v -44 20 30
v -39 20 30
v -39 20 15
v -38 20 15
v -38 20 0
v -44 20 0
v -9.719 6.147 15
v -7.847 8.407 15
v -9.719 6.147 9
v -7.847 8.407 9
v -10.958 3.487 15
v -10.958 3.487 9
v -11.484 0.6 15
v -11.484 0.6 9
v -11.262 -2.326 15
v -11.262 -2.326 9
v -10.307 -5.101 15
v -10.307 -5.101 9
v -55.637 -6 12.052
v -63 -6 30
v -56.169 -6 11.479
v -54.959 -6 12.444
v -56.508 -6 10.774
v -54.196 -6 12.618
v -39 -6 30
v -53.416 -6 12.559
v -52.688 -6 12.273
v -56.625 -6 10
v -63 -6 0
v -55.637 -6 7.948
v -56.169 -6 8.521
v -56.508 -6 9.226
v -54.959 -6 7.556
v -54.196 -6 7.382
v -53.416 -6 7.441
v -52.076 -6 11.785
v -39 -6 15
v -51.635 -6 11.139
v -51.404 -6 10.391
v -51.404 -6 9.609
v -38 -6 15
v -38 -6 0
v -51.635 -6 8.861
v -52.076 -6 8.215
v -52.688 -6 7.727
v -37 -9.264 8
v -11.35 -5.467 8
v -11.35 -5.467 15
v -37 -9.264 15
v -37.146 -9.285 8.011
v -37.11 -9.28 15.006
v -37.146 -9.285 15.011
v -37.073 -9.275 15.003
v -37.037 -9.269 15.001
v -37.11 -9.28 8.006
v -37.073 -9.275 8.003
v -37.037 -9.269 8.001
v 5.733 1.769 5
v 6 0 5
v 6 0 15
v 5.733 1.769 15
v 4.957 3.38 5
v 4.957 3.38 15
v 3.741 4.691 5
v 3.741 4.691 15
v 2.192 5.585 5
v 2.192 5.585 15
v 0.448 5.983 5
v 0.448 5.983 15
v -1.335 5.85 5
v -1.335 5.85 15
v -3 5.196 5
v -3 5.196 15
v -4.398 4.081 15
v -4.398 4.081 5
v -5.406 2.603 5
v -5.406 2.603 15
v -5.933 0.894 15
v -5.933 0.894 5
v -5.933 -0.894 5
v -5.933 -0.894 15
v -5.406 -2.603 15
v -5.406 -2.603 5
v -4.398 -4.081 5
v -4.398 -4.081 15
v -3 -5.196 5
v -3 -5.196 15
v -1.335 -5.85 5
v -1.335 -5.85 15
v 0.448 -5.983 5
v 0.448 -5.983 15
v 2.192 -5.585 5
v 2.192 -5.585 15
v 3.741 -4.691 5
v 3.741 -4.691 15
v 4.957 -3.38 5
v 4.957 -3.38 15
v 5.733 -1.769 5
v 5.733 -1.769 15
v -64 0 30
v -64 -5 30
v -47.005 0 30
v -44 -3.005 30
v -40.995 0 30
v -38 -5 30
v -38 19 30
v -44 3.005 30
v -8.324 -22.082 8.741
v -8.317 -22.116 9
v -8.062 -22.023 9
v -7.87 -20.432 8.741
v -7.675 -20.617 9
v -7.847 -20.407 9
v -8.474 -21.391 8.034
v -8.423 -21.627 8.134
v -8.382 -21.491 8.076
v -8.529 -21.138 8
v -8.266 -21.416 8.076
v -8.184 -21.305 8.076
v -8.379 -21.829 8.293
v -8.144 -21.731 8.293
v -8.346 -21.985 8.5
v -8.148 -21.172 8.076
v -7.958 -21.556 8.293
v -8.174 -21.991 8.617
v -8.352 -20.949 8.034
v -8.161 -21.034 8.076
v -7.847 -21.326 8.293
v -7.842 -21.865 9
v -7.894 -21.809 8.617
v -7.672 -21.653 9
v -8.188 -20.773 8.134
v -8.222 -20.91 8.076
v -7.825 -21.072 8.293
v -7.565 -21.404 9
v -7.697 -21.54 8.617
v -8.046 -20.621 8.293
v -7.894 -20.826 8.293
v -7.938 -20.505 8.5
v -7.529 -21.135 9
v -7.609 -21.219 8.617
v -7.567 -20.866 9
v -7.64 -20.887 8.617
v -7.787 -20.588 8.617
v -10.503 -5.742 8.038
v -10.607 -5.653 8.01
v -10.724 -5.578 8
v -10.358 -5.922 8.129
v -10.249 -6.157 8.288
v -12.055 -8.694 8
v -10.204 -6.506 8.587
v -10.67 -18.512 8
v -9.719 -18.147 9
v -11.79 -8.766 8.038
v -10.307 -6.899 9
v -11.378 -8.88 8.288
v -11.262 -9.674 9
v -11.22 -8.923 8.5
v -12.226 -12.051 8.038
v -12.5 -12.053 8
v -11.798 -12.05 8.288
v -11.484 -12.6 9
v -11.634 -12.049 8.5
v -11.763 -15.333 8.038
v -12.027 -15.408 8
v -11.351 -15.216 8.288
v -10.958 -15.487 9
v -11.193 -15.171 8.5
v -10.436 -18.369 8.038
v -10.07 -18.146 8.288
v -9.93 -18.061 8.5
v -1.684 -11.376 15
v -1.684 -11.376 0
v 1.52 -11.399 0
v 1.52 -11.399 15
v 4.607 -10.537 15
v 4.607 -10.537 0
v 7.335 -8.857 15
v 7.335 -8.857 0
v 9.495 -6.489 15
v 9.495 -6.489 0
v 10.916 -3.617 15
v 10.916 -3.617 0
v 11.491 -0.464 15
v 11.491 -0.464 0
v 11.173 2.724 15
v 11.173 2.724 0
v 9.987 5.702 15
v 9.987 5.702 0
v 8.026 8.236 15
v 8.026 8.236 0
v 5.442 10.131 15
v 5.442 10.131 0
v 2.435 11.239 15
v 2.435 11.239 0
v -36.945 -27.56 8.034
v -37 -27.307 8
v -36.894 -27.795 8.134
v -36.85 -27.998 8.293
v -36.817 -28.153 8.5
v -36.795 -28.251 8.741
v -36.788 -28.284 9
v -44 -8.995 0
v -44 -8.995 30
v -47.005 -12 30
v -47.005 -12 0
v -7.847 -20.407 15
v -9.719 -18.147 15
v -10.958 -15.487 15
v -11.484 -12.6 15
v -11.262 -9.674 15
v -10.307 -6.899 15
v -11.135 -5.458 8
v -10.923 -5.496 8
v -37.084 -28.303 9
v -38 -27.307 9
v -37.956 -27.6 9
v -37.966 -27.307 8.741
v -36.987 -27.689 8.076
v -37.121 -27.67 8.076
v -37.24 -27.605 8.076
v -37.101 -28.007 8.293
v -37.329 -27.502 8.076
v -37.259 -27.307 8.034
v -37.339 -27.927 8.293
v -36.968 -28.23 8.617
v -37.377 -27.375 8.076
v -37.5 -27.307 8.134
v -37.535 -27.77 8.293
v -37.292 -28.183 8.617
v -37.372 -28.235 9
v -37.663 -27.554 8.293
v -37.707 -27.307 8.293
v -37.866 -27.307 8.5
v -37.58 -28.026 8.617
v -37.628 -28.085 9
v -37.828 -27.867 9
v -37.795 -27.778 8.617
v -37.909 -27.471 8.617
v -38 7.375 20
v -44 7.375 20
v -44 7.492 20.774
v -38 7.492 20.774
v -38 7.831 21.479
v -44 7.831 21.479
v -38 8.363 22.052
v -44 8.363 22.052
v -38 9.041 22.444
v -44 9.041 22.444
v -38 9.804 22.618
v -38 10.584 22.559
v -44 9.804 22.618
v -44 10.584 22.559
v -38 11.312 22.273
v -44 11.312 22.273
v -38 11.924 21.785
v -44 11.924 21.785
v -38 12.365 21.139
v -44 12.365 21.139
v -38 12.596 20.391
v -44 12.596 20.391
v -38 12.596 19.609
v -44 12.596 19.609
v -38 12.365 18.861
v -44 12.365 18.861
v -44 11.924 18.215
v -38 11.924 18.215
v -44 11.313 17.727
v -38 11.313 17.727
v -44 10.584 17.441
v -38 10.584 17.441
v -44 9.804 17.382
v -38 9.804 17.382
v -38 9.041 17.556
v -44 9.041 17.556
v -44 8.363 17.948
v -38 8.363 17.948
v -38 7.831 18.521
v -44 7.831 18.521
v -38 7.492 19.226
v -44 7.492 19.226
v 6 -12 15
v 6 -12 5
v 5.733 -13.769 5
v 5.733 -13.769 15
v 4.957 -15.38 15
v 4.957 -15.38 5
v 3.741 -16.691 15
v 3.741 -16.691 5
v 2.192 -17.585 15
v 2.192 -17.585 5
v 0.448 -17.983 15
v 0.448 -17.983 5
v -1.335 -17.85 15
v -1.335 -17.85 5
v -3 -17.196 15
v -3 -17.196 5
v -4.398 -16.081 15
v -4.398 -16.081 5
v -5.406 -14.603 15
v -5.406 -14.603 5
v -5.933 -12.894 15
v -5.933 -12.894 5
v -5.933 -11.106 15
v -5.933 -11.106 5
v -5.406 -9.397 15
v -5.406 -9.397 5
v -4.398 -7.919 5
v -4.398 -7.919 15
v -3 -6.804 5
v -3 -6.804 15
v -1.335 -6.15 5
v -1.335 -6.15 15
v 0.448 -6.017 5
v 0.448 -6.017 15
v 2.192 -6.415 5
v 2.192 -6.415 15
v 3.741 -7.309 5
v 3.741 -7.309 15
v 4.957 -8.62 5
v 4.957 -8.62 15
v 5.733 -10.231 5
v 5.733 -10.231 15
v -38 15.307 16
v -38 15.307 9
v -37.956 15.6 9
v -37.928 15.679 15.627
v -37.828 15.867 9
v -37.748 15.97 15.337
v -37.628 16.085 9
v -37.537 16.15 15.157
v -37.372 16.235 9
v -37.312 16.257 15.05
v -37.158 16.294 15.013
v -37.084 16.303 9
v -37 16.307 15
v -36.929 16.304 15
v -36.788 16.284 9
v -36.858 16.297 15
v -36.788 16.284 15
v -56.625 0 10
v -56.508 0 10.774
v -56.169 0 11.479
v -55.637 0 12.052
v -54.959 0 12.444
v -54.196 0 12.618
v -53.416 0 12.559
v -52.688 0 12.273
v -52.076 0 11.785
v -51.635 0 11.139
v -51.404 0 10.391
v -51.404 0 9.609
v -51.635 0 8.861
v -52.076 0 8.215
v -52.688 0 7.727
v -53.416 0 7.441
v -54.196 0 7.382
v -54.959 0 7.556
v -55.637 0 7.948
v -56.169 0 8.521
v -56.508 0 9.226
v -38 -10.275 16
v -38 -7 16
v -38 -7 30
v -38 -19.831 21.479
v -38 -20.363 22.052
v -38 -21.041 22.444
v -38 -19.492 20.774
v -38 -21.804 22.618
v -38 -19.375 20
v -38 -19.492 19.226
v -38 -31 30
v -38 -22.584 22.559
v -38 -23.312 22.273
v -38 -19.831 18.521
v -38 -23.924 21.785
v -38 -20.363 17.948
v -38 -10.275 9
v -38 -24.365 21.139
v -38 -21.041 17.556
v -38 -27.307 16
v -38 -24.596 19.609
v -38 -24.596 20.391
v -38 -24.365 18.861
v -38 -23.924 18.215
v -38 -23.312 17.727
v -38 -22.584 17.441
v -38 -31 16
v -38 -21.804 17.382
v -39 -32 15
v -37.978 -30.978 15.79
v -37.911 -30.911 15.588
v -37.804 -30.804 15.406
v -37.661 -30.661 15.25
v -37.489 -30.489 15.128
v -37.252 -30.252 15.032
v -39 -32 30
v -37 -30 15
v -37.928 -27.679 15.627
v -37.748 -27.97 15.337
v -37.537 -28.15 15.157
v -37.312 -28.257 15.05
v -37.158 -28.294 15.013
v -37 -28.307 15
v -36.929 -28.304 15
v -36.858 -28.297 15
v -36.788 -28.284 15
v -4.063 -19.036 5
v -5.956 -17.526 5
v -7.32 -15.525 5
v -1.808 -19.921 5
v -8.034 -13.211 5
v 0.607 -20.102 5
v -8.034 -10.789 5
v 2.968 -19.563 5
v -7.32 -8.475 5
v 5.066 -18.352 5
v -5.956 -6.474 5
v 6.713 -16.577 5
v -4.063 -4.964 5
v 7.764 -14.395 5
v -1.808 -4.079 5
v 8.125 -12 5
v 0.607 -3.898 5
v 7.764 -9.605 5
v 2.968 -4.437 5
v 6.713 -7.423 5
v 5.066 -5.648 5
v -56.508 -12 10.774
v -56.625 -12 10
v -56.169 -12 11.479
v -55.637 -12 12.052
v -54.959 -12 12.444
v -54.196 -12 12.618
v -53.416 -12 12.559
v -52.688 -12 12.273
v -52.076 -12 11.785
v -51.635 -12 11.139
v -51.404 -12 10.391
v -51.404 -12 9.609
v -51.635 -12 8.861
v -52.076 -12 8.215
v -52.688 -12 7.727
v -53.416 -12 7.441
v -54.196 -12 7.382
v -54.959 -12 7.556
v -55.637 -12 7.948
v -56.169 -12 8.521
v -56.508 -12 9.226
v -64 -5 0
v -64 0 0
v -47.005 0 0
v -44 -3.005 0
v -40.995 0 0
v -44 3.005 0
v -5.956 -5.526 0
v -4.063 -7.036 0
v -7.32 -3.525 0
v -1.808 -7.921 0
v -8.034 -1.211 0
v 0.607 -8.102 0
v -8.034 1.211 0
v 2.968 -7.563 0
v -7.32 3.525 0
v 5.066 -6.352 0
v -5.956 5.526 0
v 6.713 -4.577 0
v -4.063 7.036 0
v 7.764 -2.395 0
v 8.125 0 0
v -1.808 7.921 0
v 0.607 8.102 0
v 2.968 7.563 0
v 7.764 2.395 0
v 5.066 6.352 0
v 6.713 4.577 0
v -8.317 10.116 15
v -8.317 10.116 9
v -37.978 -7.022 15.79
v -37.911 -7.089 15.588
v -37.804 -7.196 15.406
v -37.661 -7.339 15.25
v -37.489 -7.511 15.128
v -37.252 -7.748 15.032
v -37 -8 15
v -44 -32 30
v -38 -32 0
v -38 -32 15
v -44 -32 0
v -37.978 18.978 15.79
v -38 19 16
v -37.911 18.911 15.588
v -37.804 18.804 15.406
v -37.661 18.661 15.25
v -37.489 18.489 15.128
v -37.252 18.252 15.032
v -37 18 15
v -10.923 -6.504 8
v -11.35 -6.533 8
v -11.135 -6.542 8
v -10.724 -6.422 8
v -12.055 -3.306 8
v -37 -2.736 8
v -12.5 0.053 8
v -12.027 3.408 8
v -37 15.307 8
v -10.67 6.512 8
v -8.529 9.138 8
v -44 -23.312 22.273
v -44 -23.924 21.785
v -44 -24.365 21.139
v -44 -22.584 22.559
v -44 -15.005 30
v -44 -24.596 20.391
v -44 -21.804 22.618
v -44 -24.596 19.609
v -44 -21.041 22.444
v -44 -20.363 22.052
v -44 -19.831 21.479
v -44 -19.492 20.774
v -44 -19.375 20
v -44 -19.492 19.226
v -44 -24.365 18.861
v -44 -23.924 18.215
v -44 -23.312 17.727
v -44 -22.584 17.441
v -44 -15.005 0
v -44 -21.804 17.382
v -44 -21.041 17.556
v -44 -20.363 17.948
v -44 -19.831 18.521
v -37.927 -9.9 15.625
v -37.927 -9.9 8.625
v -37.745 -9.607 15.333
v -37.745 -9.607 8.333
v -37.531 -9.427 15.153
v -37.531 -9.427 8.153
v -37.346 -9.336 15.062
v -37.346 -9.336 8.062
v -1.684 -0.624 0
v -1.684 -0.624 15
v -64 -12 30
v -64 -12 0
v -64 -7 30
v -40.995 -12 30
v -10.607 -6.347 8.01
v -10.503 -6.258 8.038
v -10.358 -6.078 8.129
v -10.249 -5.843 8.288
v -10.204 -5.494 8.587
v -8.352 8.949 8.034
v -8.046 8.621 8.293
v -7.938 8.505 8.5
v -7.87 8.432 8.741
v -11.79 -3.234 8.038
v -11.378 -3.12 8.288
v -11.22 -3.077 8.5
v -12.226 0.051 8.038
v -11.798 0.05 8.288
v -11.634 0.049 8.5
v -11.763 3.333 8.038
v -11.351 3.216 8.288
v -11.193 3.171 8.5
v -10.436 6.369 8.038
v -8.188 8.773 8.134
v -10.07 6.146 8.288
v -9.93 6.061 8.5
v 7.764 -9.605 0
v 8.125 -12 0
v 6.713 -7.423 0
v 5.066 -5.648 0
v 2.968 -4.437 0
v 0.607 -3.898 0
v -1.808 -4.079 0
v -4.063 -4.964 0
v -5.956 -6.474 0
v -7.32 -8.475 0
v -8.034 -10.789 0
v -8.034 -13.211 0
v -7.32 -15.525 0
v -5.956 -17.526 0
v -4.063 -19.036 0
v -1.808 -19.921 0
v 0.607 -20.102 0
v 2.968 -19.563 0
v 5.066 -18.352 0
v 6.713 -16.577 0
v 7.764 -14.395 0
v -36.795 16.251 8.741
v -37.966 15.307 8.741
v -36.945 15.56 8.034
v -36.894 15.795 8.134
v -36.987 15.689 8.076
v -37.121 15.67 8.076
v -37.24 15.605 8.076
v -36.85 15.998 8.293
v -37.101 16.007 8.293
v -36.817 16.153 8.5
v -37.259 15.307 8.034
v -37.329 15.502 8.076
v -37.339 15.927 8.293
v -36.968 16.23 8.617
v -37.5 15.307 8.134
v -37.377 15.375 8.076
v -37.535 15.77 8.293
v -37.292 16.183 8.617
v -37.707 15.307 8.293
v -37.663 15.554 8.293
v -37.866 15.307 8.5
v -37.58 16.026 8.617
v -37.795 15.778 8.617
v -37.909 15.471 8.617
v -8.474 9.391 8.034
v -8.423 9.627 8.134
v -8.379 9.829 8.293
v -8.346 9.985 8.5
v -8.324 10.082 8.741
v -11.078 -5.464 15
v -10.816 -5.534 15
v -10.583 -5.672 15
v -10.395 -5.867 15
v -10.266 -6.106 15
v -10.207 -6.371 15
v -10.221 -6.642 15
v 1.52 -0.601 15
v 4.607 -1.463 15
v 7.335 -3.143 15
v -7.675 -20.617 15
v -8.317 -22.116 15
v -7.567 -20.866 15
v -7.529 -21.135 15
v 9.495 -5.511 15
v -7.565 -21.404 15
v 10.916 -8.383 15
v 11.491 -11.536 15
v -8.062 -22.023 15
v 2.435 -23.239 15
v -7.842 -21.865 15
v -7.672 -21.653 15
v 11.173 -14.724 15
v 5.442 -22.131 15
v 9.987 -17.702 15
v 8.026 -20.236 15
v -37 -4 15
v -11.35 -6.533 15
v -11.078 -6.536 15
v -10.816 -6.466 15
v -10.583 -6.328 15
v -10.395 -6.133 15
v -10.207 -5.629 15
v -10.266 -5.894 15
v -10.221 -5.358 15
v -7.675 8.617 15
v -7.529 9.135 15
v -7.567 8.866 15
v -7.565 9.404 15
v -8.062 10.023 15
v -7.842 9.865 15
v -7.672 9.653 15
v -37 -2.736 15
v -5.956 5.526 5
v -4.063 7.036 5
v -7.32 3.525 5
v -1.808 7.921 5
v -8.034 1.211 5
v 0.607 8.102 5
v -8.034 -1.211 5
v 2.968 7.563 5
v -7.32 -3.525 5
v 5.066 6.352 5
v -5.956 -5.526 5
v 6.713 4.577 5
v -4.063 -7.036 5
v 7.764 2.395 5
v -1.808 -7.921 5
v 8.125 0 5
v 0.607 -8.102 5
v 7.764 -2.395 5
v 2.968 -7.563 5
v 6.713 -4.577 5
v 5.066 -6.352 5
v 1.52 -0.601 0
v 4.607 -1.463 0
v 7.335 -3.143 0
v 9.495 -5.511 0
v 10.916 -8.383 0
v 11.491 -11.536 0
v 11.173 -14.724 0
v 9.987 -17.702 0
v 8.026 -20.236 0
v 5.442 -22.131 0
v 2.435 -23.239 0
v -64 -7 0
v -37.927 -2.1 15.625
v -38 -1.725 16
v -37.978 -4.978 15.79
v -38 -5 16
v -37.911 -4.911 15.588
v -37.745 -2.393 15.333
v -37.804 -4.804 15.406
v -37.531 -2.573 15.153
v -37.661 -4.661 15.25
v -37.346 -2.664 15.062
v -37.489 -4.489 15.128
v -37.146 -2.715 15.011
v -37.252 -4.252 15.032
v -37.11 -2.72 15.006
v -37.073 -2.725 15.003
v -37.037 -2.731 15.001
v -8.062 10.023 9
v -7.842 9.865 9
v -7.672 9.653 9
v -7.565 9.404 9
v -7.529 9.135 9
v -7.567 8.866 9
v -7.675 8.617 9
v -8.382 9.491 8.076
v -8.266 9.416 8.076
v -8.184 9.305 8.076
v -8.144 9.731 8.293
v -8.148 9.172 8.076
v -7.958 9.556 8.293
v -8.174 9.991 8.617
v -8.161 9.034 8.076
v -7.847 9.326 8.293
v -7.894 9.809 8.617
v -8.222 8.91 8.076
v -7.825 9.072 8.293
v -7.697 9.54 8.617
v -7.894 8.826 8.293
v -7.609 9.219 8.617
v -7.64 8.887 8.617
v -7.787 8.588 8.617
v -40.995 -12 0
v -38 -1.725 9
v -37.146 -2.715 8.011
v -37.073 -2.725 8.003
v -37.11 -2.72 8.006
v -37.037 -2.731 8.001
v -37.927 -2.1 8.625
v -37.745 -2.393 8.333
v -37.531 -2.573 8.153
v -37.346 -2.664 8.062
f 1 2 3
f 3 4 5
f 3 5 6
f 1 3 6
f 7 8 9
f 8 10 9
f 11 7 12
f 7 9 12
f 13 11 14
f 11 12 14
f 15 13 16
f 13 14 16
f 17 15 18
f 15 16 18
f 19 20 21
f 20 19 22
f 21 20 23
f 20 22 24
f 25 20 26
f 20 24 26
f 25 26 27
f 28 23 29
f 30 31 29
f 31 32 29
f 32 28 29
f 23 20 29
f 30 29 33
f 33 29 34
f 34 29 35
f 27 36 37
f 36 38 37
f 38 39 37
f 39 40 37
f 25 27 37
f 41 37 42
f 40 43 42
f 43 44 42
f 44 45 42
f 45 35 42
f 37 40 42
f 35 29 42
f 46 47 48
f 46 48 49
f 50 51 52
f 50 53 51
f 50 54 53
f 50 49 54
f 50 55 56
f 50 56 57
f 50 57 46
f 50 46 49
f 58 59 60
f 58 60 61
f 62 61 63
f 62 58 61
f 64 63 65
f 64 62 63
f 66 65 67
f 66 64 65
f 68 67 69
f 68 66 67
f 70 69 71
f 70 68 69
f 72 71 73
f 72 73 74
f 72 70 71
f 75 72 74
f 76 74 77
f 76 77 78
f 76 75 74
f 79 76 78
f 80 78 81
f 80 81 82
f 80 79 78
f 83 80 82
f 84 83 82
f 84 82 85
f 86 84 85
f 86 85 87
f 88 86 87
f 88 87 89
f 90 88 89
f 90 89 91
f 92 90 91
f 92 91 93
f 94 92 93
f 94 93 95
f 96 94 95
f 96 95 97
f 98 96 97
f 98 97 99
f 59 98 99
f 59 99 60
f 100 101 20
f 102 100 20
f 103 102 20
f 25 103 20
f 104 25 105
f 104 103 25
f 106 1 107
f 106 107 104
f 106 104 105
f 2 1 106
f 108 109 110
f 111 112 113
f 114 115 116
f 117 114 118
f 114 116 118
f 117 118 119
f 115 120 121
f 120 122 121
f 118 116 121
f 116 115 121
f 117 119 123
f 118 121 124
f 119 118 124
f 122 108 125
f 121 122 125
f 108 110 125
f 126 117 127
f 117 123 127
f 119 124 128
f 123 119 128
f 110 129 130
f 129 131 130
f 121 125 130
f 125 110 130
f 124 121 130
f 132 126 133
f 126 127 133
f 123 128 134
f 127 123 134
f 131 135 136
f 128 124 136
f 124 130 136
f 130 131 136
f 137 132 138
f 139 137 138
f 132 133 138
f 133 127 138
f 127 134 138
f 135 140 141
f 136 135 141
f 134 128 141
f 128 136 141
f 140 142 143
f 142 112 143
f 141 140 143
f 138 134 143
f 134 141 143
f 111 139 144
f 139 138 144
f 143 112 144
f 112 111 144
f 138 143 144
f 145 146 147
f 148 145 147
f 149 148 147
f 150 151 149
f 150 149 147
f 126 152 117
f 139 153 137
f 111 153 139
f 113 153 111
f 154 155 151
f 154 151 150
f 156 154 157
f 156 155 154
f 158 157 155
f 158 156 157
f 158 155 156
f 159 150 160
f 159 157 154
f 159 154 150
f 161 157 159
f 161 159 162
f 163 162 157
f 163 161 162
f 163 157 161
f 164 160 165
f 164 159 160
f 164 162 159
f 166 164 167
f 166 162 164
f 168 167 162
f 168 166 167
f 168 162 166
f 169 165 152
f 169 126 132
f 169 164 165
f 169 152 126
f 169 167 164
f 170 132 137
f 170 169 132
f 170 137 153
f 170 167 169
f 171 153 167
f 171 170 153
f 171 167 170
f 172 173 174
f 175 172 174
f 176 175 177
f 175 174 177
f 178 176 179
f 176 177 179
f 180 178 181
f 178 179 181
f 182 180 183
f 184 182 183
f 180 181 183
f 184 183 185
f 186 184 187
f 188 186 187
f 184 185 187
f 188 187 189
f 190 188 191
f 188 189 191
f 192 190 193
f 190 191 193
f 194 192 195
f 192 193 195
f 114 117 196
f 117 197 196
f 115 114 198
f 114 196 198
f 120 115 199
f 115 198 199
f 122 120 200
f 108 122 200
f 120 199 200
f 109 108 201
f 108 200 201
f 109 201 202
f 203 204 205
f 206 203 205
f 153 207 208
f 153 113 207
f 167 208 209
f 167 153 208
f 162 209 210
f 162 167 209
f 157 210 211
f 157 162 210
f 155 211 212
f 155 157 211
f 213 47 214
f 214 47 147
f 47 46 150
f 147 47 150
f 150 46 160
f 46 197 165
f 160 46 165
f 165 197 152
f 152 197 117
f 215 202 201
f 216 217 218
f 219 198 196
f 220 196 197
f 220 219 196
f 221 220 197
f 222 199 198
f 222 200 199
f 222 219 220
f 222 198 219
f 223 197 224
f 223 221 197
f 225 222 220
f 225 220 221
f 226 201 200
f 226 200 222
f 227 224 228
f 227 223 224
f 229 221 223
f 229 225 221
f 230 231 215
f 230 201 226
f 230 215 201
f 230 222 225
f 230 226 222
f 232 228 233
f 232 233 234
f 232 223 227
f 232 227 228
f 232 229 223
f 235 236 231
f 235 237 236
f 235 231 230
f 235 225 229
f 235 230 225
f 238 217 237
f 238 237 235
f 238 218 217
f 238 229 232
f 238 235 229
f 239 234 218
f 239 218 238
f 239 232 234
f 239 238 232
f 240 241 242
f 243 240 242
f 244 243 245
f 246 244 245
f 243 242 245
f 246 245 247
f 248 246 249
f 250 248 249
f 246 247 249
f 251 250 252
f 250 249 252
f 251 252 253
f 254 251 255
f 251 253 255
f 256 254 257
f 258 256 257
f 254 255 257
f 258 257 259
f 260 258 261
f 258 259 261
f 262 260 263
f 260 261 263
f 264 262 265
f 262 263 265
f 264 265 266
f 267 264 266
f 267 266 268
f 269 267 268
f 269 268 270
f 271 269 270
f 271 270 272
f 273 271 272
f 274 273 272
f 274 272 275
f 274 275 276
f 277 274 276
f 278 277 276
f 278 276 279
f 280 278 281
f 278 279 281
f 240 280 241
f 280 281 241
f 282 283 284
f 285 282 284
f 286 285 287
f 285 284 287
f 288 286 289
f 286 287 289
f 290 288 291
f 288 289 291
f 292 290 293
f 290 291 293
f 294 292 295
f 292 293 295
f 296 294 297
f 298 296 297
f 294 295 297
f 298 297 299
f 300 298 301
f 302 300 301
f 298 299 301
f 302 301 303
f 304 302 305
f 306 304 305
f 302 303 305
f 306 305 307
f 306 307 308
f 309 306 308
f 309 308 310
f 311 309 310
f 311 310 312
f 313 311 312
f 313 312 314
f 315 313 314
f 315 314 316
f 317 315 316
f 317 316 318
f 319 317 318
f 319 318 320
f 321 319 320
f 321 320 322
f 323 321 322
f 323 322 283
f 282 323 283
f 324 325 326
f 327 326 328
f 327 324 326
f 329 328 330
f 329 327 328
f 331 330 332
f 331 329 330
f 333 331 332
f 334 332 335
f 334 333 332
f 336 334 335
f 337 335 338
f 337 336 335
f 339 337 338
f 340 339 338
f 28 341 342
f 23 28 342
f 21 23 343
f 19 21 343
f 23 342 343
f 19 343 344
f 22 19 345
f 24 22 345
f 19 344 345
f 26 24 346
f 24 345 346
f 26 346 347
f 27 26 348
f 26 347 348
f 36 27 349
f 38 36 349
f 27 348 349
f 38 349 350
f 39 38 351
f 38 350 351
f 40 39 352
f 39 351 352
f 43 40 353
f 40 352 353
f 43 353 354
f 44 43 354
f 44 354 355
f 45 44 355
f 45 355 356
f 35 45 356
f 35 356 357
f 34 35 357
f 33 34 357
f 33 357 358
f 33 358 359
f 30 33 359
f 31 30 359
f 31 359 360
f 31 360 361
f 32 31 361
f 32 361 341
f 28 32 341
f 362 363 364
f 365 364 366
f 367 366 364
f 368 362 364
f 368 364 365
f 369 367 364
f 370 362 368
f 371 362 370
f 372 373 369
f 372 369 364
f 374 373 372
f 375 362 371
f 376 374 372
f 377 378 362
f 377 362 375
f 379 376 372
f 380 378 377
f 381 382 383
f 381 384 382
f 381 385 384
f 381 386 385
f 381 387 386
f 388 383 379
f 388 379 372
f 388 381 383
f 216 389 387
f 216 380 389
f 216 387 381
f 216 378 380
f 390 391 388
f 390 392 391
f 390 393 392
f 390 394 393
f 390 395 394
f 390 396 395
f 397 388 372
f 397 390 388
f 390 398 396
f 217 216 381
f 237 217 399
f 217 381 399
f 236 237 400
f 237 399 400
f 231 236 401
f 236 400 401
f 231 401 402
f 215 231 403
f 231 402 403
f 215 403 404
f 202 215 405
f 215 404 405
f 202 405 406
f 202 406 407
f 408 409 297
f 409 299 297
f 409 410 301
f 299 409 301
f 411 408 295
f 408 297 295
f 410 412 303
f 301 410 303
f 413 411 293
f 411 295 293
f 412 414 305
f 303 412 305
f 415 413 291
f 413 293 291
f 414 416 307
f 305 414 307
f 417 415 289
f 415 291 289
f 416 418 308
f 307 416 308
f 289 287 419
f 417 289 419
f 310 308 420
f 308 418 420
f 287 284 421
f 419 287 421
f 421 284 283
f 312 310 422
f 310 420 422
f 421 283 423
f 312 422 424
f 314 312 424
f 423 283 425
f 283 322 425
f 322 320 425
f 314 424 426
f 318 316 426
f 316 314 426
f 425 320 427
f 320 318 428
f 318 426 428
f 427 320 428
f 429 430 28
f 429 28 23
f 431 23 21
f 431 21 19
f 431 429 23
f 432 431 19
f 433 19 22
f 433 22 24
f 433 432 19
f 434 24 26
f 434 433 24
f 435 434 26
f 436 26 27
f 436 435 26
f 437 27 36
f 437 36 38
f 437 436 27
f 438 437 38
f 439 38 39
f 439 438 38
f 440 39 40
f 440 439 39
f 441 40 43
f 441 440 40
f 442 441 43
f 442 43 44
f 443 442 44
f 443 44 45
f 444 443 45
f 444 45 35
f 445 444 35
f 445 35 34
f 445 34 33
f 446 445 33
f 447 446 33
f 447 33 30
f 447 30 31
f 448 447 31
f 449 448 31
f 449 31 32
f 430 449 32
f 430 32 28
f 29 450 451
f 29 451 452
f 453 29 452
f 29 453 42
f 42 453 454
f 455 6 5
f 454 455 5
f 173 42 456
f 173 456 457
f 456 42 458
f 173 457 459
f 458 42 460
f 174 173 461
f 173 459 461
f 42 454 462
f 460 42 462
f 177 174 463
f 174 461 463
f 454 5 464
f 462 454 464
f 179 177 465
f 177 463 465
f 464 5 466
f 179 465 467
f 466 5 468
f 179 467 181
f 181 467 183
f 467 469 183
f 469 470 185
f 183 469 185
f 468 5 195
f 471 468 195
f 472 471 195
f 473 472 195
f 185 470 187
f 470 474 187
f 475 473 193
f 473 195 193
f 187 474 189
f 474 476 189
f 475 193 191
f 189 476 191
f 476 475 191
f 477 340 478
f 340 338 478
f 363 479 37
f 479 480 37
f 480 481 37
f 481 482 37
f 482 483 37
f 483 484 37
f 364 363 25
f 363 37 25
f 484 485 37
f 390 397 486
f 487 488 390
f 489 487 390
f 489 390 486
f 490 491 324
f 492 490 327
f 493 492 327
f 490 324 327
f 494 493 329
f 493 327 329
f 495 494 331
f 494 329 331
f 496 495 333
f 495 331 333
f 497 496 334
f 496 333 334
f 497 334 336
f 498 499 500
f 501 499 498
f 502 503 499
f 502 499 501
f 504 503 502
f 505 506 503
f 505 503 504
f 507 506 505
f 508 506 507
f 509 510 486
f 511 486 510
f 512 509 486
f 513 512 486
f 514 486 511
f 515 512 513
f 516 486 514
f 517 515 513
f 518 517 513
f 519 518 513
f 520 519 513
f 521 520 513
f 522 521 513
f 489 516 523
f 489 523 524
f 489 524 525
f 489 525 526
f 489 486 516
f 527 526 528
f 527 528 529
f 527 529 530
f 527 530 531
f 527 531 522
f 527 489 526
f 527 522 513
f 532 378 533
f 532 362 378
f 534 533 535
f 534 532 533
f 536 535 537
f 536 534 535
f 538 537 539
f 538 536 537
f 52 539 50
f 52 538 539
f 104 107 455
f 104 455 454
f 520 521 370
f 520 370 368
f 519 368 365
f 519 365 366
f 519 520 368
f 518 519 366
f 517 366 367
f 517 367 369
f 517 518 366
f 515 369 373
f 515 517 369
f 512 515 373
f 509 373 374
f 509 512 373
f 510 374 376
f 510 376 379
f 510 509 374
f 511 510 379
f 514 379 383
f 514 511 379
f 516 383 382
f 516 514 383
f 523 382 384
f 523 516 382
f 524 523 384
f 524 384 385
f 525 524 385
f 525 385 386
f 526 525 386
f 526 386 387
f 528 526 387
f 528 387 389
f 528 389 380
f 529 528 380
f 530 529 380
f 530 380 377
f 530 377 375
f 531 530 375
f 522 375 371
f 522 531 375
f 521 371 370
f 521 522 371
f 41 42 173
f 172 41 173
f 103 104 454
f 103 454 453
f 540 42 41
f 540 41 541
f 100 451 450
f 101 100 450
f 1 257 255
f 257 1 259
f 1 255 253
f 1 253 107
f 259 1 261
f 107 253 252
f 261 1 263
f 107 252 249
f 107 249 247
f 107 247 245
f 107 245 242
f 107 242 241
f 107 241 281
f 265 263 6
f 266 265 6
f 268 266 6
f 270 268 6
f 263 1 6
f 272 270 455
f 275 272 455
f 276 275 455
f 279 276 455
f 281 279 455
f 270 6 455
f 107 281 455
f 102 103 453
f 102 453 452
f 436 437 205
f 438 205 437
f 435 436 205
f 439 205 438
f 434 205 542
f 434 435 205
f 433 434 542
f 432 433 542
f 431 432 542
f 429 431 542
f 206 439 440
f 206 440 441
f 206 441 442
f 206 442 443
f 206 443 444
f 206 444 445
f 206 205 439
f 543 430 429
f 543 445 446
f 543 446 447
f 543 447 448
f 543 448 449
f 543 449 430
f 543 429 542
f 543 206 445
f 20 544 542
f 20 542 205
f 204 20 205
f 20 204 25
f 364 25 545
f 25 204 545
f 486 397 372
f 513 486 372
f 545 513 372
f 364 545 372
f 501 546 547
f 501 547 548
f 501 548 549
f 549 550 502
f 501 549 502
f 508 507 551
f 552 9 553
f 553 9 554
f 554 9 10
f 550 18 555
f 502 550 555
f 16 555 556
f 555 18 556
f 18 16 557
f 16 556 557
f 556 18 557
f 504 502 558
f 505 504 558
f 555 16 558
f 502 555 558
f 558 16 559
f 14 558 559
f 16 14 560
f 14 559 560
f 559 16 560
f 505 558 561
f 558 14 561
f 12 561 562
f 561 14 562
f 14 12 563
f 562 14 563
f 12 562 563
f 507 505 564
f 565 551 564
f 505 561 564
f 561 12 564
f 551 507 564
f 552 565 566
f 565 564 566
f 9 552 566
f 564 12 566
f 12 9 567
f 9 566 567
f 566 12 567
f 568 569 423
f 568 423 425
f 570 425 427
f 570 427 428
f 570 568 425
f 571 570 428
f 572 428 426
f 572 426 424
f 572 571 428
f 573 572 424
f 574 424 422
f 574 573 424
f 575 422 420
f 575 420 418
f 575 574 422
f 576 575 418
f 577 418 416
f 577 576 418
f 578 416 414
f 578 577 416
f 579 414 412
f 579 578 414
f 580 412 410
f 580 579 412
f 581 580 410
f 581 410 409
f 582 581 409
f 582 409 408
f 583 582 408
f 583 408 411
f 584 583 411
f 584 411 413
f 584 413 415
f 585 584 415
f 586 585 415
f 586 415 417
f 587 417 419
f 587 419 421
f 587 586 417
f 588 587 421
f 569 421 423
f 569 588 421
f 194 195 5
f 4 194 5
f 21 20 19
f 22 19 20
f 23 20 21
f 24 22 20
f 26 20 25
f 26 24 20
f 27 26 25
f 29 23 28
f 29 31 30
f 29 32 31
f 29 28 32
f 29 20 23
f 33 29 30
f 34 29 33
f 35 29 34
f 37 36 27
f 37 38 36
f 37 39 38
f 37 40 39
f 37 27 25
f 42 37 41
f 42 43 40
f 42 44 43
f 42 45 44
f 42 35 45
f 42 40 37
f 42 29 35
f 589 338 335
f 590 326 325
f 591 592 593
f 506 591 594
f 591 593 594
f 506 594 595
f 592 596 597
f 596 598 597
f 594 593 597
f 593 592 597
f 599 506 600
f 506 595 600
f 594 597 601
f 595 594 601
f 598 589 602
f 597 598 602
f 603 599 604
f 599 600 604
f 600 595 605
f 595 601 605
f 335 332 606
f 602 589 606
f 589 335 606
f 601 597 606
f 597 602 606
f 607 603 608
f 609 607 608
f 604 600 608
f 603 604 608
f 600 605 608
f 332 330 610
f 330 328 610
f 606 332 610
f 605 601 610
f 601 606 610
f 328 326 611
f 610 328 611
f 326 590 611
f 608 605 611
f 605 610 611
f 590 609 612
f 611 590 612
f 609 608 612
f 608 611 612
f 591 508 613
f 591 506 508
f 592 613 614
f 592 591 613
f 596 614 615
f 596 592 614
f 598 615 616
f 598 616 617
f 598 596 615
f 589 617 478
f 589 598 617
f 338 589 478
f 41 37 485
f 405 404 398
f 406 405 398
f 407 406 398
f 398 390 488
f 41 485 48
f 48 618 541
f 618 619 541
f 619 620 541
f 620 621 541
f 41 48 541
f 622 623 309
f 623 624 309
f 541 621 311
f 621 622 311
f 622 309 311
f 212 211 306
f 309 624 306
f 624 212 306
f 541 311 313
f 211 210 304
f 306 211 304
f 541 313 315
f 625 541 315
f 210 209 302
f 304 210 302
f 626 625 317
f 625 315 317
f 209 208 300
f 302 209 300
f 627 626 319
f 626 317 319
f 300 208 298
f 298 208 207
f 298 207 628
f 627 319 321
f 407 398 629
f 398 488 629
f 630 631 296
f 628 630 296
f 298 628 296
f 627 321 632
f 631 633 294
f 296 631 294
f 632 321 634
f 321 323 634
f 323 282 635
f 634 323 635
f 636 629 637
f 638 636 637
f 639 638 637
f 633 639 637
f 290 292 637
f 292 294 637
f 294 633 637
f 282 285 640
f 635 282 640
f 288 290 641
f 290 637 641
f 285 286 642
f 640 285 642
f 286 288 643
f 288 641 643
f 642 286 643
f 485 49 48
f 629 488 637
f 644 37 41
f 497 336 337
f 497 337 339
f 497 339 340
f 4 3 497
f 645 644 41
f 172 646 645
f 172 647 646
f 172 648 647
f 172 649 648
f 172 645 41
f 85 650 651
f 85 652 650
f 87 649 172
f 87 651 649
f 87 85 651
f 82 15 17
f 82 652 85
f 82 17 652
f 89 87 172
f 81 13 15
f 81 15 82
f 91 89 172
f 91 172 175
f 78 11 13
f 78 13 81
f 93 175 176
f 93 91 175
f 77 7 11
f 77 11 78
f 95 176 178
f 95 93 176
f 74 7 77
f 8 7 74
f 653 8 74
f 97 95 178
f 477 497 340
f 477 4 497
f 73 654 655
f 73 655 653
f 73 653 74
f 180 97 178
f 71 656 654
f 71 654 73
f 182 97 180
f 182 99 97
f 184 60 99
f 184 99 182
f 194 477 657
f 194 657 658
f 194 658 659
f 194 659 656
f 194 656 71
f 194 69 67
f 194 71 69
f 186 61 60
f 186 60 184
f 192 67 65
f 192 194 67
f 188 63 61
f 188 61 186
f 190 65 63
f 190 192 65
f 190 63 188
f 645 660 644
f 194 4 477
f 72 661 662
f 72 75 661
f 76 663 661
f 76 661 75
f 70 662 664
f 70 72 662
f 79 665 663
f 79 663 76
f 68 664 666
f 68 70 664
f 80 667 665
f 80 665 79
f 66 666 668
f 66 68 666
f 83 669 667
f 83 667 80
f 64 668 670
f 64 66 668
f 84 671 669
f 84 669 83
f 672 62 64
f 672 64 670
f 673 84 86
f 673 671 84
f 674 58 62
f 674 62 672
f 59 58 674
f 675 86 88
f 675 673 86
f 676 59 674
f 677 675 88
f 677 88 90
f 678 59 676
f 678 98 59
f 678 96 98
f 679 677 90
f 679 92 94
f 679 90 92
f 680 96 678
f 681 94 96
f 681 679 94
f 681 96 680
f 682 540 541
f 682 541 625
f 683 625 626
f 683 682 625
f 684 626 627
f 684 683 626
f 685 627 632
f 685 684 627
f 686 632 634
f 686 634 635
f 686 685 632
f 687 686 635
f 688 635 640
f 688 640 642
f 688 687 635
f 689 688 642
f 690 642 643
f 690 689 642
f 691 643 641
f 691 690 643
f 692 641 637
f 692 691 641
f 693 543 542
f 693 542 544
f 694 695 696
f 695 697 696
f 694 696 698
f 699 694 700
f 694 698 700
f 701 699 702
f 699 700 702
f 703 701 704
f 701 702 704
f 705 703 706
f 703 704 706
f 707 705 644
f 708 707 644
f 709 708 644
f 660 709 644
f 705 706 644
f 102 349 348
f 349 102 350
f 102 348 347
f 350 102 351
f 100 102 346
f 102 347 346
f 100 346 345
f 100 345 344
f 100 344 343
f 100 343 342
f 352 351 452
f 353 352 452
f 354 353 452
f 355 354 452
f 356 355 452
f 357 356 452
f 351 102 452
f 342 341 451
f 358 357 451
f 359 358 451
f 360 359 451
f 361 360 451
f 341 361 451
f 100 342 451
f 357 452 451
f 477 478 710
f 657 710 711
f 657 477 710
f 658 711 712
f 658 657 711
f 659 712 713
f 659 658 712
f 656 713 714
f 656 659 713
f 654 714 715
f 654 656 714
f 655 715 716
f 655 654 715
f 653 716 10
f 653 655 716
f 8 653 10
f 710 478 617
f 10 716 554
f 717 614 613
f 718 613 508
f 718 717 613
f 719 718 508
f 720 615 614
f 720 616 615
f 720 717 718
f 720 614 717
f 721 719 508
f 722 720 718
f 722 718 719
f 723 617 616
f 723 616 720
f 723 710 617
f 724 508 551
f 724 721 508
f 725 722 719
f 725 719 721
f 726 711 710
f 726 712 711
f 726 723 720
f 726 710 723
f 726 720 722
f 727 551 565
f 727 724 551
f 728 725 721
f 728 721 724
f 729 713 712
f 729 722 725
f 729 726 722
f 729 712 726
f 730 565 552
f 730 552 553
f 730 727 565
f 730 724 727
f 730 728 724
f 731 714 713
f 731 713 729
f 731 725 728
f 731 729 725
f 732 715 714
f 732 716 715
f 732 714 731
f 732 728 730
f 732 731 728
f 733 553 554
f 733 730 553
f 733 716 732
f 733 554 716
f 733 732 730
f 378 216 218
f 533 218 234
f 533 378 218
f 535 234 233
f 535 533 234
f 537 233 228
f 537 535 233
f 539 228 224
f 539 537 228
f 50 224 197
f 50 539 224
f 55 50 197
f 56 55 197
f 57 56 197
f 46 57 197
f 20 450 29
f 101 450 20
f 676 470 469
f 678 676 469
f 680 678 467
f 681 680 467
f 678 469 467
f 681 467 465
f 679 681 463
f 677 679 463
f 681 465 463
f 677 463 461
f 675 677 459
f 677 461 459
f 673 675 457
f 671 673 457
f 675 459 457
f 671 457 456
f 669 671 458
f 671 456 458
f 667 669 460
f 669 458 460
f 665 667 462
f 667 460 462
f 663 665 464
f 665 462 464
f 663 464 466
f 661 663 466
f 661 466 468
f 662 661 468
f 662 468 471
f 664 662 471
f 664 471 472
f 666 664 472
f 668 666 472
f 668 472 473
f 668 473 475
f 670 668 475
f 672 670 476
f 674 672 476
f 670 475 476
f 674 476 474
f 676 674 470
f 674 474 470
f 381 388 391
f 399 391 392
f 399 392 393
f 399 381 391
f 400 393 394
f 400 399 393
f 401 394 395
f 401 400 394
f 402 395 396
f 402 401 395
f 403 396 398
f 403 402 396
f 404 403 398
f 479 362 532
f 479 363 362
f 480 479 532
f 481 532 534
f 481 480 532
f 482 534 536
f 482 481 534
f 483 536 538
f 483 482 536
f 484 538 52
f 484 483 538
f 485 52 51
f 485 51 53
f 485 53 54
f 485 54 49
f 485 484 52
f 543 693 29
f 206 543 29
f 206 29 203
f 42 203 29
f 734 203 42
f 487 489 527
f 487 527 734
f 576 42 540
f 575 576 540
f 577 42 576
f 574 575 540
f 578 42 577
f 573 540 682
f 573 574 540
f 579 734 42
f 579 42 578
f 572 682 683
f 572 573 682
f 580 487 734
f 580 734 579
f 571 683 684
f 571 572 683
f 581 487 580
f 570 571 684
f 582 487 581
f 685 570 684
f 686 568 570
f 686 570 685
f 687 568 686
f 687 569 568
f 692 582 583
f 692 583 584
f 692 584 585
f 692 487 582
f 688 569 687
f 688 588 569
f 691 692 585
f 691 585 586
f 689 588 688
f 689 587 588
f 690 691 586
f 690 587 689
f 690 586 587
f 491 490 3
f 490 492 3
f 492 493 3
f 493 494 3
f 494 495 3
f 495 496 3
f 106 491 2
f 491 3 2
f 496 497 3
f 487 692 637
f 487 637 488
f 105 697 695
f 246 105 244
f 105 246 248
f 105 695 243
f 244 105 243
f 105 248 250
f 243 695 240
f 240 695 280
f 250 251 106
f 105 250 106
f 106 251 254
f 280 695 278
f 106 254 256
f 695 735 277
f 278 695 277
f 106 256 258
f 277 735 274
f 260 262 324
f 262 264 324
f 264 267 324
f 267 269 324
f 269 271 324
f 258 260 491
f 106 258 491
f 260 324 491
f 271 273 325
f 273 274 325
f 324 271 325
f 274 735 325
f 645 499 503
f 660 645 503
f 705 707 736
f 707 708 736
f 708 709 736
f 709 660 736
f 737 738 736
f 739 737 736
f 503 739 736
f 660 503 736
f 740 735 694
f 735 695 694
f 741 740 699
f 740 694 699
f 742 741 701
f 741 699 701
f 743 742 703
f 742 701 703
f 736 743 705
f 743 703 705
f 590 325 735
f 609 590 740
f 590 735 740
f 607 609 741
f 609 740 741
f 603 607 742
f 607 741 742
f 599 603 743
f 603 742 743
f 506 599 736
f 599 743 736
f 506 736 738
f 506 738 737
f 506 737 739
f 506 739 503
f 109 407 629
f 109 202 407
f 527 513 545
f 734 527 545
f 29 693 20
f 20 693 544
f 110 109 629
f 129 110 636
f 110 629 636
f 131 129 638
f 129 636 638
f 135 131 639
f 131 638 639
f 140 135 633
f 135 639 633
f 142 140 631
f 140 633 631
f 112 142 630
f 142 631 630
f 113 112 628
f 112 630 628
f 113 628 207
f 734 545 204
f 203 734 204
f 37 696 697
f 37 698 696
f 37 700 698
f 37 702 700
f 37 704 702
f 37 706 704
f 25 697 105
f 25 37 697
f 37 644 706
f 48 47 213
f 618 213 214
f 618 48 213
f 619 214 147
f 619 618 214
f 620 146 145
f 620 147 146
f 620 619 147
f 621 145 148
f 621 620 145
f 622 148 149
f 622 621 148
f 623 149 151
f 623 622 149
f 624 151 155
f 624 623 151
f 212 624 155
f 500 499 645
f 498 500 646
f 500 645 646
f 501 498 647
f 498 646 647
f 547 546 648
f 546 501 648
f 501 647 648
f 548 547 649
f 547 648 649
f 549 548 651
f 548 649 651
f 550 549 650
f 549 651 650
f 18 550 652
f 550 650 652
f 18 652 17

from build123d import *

# Parameters (mm, degrees)
F1_R      = 6
F2_DEPTH  = 8
F3_R      = 6
F4_DEPTH  = 15
F6_DEPTH  = 30
F7_SIZE   = 1
F8_R      = 1
F9_R      = 8.125
F10_DEPTH = 5
F11_R     = 2.625
F12_DEPTH = 11.501
F13_R     = 2.625
F14_DEPTH = 6


with BuildPart() as f2:
    # F1 (on Top) → F2 (new body)
    with BuildSketch(Plane.XY):
        with BuildLine():
            ThreePointArc((-1.6840484339, -11.3760265854), (11.3138603774, -2.0607191369), (2.4351188346, 11.2392257857))
            Line((2.4351188346, 11.2392257857), (-38, 20))
            Line((-38, 20), (-38, -6))
            Line((-38, -6), (-1.6840484339, -11.3760265854))
        make_face()
        Circle(F1_R, mode=Mode.SUBTRACT)
    extrude(amount=F2_DEPTH)

    # F3 (on Top) → F4 (join)
    with BuildSketch(Plane.XY):
        with BuildLine():
            Line((-38, 16.5466927402), (-6.2334383583, 9.6640698587))
            ThreePointArc((-6.2334383583, 9.6640698587), (-11.3138603774, 2.0607191369), (-9.2405323218, -6.8456235954))
            Line((-9.2405323218, -6.8456235954), (-38, -2.5882199986))
            Line((-38, -2.5882199986), (-38, -6))
            Line((-38, -6), (-1.6840484339, -11.3760265854))
            ThreePointArc((-1.6840484339, -11.3760265854), (11.3138603774, -2.0607191369), (2.4351188346, 11.2392257857))
            Line((2.4351188346, 11.2392257857), (-38, 20))
            Line((-38, 20), (-38, 16.5466927402))
        make_face()
        Circle(F3_R, mode=Mode.SUBTRACT)
    extrude(amount=F4_DEPTH)

    # F5 (on Top) → F6 (join)
    with BuildSketch(Plane.XY):
        Polygon((-38, -6), (-38, 20), (-44, 20), (-44, 3.00520382), (-40.99479618, 0), (-44, -3.00520382), (-47.00520382, 0), (-64, 0), (-64, -6), align=None)
    extrude(amount=F6_DEPTH)

    # F7
    f7_edges = [f2.edges().sort_by_distance(p)[0] for p in [
        (-64, -6, 15),
        (-38, 20, 22.5),
        (-38, -6, 22.5),
    ]]
    chamfer(f7_edges, length=F7_SIZE)

    # F8
    f8_edges = [f2.edges().sort_by_distance(p)[0] for p in [
        (-22.116719, 13.105381, 8),
        (-38, 6.979236, 8),
        (-38, -3.79411, 15),
        (-38, 17.773346, 15),
        (-11.31386, 2.060719, 8),
        (-6.233438, 9.66407, 11.5),
        (-9.240532, -6.845624, 11.5),
        (-38, 16.546693, 11.5),
        (-38, -2.58822, 11.5),
    ]]
    fillet(f8_edges, radius=F8_R)

    # F9 (on face) → F10 (cut)
    with BuildSketch(Plane(origin=(0, 0, 0), x_dir=(1, 0, 0), z_dir=(0, 0, -1))):
        Circle(F9_R)
    extrude(amount=-F10_DEPTH, mode=Mode.SUBTRACT)

    # F11 (on face) → F12 (cut, through all)
    with BuildSketch(Plane(origin=(0, 0, 0), x_dir=(-1, 0, 0), z_dir=(0, 1, 0))):
        with Locations((54, 10)):
            Circle(F11_R)
    extrude(amount=-F12_DEPTH, mode=Mode.SUBTRACT)

    # F13 (on face) → F14 (cut, through all)
    with BuildSketch(Plane(origin=(-44, 0, 0), x_dir=(0, -1, 0), z_dir=(-1, 0, 0))):
        with Locations((-10, 20)):
            Circle(F13_R)
    extrude(amount=-F14_DEPTH, mode=Mode.SUBTRACT)


with BuildPart() as f15_1:
    # F15: instance of F2
    add(f2.part.mirror(Plane(origin=(-50.64611798, -6, 14.9940249514), x_dir=(1, 0, 0), z_dir=(0, -1, 0))))


solid = Compound([f2.part, f15_1.part])
